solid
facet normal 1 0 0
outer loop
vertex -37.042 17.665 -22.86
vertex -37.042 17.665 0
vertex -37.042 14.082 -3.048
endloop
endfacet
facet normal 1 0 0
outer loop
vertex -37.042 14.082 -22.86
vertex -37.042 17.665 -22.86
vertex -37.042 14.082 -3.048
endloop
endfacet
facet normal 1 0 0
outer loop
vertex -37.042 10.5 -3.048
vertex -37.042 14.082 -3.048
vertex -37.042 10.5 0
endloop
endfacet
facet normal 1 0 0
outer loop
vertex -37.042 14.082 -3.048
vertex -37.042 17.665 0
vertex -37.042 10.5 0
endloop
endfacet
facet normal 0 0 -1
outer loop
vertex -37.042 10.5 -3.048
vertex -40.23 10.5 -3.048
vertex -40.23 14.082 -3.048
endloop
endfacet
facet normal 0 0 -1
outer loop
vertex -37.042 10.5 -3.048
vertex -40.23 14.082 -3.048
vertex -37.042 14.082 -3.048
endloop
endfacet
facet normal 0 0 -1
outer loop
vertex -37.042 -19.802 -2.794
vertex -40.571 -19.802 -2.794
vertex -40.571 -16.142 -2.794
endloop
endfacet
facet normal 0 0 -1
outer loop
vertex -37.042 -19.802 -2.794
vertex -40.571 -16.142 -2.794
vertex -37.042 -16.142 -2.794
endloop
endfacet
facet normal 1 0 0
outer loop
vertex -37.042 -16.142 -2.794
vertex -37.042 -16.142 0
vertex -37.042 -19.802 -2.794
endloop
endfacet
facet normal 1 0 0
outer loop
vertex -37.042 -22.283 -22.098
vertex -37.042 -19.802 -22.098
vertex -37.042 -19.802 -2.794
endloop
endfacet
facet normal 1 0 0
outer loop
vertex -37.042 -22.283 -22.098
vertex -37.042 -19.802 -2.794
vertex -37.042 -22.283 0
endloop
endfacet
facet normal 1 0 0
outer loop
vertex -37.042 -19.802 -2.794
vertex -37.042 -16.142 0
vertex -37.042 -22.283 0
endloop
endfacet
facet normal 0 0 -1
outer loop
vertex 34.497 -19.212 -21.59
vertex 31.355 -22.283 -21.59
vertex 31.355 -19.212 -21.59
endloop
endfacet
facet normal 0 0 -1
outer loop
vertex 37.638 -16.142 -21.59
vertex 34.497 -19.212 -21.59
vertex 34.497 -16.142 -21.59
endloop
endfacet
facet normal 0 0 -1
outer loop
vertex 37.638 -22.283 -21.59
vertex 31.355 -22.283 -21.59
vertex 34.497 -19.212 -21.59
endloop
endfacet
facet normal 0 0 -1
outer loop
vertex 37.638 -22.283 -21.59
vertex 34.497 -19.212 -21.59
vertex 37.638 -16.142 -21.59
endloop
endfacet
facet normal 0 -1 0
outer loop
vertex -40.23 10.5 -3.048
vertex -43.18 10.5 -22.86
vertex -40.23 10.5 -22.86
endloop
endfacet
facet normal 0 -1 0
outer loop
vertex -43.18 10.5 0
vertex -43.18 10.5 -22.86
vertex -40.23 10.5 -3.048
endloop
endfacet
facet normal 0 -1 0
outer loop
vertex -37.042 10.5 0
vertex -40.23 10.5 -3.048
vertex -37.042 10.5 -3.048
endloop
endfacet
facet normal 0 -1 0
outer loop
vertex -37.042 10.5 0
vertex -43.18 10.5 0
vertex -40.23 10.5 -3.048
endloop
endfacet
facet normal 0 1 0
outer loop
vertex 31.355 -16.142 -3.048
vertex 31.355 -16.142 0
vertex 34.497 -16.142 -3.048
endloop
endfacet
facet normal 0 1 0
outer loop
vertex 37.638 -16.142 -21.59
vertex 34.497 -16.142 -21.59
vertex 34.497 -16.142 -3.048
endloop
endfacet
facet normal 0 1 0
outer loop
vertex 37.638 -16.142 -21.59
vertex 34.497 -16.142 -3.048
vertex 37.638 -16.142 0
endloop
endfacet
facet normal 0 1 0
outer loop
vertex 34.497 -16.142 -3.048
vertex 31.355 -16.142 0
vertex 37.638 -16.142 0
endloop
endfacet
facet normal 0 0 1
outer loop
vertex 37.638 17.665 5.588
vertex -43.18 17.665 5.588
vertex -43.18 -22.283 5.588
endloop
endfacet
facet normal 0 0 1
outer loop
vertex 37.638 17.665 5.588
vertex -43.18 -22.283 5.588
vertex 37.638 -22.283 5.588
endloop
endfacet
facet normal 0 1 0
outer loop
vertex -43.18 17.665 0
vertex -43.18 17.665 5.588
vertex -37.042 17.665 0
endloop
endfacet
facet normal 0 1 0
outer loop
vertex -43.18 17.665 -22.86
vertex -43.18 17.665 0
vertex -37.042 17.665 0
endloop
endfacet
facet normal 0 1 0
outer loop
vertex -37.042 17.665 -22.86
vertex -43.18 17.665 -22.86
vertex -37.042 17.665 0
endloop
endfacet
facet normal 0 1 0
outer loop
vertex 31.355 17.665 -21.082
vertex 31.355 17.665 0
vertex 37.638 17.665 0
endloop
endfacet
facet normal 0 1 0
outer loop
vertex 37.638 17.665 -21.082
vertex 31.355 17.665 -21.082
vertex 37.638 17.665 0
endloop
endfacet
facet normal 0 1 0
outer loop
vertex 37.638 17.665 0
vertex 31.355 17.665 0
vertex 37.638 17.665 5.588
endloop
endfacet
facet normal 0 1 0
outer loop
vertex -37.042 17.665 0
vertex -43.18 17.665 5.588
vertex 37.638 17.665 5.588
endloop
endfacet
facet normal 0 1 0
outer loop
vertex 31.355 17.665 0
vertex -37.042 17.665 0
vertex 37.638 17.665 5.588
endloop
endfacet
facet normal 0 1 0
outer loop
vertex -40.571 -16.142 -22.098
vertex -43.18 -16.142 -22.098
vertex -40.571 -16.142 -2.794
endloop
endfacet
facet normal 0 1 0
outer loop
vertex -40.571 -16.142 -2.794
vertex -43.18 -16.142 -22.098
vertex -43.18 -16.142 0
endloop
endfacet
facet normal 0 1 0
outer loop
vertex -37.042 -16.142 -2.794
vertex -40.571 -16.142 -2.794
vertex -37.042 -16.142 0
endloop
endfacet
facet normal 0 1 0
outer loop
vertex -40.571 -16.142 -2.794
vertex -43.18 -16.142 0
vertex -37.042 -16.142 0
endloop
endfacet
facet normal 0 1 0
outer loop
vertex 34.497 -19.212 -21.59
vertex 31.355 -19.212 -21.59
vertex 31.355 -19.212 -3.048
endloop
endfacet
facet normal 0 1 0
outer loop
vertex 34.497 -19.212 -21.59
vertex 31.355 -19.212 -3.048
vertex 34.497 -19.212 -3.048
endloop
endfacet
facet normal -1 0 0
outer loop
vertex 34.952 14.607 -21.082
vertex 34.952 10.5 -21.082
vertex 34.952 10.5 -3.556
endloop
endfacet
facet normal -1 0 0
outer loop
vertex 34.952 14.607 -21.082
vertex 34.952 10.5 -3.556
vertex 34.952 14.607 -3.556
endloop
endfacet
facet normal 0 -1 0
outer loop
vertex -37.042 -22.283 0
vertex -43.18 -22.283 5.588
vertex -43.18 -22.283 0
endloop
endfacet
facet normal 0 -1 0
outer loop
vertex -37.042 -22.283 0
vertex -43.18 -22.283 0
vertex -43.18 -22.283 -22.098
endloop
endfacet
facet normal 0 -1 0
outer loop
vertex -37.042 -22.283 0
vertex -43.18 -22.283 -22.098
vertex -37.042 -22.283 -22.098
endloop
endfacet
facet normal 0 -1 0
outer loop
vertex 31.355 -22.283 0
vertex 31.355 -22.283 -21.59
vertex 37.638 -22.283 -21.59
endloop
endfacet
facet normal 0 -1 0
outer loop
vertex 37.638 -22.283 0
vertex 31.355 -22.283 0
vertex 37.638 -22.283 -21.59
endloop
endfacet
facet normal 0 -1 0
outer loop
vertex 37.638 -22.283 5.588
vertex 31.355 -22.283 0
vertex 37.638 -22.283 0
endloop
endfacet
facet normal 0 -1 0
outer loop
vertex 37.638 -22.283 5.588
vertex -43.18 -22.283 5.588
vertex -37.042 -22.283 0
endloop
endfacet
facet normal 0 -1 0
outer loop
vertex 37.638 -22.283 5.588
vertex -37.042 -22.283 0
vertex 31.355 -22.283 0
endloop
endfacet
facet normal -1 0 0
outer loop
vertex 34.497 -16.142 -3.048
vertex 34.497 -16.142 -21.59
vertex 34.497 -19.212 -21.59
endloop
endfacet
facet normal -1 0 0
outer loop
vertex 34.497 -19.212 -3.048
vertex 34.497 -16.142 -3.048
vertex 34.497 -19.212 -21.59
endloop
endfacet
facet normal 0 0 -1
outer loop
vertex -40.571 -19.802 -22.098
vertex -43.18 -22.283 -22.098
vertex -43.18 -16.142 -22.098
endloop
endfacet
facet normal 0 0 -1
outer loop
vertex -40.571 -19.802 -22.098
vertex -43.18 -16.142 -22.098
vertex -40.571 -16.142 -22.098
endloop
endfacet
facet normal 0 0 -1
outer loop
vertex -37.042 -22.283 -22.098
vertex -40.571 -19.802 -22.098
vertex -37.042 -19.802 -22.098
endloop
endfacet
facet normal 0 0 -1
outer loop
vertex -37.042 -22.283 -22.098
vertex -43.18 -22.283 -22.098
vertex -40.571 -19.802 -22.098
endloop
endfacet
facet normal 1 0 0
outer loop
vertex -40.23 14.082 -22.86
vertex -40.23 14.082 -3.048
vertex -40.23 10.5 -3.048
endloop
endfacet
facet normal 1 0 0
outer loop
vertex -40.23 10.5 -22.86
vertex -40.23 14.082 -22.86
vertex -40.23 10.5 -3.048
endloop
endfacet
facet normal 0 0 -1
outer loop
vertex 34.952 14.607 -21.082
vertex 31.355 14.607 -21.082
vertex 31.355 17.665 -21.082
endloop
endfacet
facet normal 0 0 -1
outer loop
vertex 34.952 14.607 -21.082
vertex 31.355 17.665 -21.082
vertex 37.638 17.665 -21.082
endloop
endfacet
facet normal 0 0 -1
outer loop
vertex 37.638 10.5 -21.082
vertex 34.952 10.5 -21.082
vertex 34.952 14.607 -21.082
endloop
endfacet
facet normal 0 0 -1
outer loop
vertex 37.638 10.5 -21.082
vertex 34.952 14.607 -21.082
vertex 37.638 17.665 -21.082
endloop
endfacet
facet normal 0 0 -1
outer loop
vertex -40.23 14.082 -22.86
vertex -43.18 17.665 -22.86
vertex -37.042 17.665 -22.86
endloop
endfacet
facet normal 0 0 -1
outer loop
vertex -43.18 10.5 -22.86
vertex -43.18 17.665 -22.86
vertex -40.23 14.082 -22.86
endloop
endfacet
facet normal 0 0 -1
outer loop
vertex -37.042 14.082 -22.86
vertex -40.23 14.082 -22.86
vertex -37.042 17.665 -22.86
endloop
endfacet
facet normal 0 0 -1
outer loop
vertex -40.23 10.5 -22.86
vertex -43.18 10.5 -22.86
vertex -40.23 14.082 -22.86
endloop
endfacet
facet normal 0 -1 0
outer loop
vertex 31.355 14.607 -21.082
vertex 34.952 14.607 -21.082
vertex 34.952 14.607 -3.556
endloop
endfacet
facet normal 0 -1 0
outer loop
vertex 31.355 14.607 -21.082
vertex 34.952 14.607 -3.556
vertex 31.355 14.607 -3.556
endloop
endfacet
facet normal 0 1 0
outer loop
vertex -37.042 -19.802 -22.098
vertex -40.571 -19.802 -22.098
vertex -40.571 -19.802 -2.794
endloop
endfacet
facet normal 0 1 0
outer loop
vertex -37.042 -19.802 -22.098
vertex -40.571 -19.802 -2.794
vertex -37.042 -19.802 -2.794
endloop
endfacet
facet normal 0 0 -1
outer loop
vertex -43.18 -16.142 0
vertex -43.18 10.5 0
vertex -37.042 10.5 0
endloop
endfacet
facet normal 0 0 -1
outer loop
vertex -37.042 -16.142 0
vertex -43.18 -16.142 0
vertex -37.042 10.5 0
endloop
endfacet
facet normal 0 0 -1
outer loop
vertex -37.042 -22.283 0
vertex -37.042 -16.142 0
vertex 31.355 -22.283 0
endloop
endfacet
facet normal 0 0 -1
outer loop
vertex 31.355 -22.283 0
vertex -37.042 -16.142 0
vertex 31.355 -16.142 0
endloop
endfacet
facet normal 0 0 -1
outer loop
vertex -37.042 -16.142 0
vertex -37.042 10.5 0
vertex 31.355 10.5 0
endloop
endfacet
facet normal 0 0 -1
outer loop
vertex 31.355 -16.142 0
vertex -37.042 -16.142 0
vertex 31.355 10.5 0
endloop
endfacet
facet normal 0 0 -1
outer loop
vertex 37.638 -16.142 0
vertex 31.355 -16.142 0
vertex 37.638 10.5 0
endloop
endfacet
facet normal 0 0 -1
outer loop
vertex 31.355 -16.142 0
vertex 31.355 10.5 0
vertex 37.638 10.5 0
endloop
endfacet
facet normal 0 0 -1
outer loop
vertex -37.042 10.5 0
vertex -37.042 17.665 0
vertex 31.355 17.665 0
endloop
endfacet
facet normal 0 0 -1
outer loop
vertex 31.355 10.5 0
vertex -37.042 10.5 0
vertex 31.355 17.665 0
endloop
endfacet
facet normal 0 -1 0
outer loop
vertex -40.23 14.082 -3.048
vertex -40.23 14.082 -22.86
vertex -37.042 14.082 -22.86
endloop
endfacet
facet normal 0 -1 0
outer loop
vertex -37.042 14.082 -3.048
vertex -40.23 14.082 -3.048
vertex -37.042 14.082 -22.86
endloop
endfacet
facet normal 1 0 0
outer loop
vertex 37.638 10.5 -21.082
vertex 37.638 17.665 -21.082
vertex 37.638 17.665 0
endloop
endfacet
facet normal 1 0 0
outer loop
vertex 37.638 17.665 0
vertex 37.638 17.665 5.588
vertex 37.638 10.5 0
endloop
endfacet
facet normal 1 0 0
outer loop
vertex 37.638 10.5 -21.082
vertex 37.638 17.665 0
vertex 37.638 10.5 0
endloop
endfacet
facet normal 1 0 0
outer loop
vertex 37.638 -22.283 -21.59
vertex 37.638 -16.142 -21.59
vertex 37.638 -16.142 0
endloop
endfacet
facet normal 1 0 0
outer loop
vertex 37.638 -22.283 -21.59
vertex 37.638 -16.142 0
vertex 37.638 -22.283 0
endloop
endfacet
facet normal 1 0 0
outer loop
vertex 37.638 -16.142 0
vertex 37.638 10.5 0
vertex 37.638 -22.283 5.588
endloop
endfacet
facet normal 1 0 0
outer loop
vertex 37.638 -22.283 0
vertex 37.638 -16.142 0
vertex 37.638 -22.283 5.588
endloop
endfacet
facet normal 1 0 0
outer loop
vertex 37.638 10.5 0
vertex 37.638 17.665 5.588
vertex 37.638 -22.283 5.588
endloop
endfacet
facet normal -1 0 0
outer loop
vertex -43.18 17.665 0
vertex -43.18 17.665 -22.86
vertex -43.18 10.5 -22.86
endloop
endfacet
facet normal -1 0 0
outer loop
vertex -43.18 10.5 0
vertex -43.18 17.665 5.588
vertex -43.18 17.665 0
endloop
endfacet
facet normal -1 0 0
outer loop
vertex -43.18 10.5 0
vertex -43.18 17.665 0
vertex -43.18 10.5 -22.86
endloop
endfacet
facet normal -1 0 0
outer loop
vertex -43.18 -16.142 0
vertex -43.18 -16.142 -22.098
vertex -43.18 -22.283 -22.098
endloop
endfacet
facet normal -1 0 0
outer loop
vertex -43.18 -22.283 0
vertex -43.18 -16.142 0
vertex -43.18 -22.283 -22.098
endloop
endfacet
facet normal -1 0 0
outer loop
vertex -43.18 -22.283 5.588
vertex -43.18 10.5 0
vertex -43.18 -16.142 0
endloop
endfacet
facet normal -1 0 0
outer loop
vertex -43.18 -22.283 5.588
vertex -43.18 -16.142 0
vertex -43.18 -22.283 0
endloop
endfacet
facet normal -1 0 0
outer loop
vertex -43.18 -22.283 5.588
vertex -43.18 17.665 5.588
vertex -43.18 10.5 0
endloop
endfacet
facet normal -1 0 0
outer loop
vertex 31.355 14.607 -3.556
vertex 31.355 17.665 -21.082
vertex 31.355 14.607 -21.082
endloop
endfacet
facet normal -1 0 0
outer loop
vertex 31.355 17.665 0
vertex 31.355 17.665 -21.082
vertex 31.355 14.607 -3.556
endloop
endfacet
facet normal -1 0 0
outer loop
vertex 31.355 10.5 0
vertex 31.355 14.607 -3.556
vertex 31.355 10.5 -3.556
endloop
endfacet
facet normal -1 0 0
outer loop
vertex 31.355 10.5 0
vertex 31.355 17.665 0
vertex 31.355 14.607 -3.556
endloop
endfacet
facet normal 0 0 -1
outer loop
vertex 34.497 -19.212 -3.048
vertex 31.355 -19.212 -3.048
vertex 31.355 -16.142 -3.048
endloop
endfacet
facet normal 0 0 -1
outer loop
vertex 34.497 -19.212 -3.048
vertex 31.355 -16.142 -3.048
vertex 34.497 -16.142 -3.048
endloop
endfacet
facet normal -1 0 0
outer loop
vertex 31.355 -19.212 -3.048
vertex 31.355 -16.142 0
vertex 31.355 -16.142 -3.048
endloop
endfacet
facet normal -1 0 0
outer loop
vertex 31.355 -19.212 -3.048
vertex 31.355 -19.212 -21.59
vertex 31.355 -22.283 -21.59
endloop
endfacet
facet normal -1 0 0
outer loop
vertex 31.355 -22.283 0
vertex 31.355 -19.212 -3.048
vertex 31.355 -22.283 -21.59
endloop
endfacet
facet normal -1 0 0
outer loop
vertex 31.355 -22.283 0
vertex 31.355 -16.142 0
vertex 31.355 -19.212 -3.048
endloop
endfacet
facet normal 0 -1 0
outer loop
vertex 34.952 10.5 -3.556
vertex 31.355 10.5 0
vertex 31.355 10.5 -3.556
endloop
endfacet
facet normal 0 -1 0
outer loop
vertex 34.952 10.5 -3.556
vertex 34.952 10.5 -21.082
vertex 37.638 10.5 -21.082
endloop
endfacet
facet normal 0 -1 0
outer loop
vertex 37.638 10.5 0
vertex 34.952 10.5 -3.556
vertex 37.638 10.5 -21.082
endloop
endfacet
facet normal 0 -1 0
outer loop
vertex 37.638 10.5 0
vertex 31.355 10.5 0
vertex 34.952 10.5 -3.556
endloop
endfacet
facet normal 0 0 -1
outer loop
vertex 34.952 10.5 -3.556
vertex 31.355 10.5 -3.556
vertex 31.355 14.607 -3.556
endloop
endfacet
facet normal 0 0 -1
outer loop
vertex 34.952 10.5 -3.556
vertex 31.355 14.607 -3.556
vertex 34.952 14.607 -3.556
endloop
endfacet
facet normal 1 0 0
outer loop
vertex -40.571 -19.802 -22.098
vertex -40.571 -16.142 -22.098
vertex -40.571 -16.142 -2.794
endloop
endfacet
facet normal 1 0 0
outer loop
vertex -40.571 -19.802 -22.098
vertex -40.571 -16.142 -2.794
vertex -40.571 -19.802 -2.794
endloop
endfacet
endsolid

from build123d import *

# Parameters (mm, degrees)
F0_W      = 80.8181799948
F0_H      = 39.9472732097
F1_DEPTH  = 5.588
F2_W      = 6.1383359134
F2_H      = 6.141224876
F3_DEPTH  = 22.098
F2_H_2    = 7.1644689888
F4_DEPTH  = 22.86
F2_W_2    = 6.2832608819
F5_DEPTH  = 21.59
F6_DEPTH  = 23.114
F7_W      = 3.141630441
F7_H      = 3.070612438
F8_DEPTH  = 18.542
F9_DEPTH  = 25.4
F11_W     = 3.5289935768
F11_H     = 3.6606490612
F13_DEPTH = 19.304
F14_DEPTH = 27.432
F15_DEPTH = 44.958
F12_W     = 3.1885020435
F12_H     = 3.5822344944
F16_DEPTH = 19.812


with BuildPart() as f1:
    # F0 (on Top) → F1 (new body)
    with BuildSketch(Plane.XY):
        with Locations((-2.7709100395, -2.3090904579)):
            Rectangle(F0_W, F0_H)
    extrude(amount=F1_DEPTH)

    # F2 (on face) → F3 (join)
    with BuildSketch(Plane(origin=(0, 0, 0), x_dir=(1, 0, 0), z_dir=(0, 0, -1))):
        with Locations((-40.1108320802, 19.2121146247)):
            Rectangle(F2_W, F2_H)
    extrude(amount=F3_DEPTH)

    # F2 (on face) → F4 (join)
    with BuildSketch(Plane(origin=(0, 0, 0), x_dir=(1, 0, 0), z_dir=(0, 0, -1))):
        with Locations((-40.1108320802, -14.0823116526)):
            Rectangle(F2_W, F2_H_2)
    extrude(amount=F4_DEPTH)

    # F2 (on face) → F5 (join)
    with BuildSketch(Plane(origin=(0, 0, 0), x_dir=(1, 0, 0), z_dir=(0, 0, -1))):
        with Locations((34.4965495169, 19.2121146247)):
            Rectangle(F2_W_2, F2_H)
    extrude(amount=F5_DEPTH)

    # F2 (on face) → F6 (join)
    with BuildSketch(Plane(origin=(0, 0, 0), x_dir=(1, 0, 0), z_dir=(0, 0, -1))):
        with Locations((34.4965495169, -14.0823116526)):
            Rectangle(F2_W_2, F2_H_2)
    extrude(amount=F6_DEPTH)

    # F7 (on face) → F8 (cut)
    with BuildSketch(Plane(origin=(0, 0, -21.59), x_dir=(1, 0, 0), z_dir=(0, 0, -1))):
        with Locations((32.9257342964, 17.6768084057)):
            Rectangle(F7_W, F7_H)
    extrude(amount=-F8_DEPTH, mode=Mode.SUBTRACT)

    # F9 (add): a face of the model
    f9_faces = [f1.faces().sort_by_distance(p)[0] for p in [
        (34.4965495169, 14.0823116526, -23.114),
    ]]
    extrude(f9_faces, amount=F9_DEPTH)

    # F11 (on face) → F13 (cut)
    with BuildSketch(Plane(origin=(0, 0, -22.098), x_dir=(1, 0, 0), z_dir=(0, 0, -1))):
        with Locations((-38.8061609119, 17.9718267173)):
            Rectangle(F11_W, F11_H)
    extrude(amount=-F13_DEPTH, mode=Mode.SUBTRACT)

    # F10 (on face) → F14 (cut)
    with BuildSketch(Plane(origin=(0, 0, -48.514), x_dir=(1, 0, 0), z_dir=(0, 0, -1))):
        Polygon((37.6381799579, -10.5000771582), (34.951556474, -10.5000771582), (34.951556474, -14.6074714139), (31.354919076, -14.6074714139), (31.354919076, -17.664546147), (37.6381799579, -17.664546147), align=None)
    extrude(amount=-F14_DEPTH, mode=Mode.SUBTRACT)

    # F15 (cut): a face of the model
    f15_faces = [f1.faces().sort_by_distance(p)[0] for p in [
        (33.153237775, 12.5537742861, -48.514),
    ]]
    extrude(f15_faces, amount=-F15_DEPTH, mode=Mode.SUBTRACT)

    # F12 (on face) → F16 (cut)
    with BuildSketch(Plane(origin=(0, 0, -22.86), x_dir=(1, 0, 0), z_dir=(0, 0, -1))):
        with Locations((-38.6359151453, -12.2911944054)):
            Rectangle(F12_W, F12_H)
    extrude(amount=-F16_DEPTH, mode=Mode.SUBTRACT)


solid = f1.part
